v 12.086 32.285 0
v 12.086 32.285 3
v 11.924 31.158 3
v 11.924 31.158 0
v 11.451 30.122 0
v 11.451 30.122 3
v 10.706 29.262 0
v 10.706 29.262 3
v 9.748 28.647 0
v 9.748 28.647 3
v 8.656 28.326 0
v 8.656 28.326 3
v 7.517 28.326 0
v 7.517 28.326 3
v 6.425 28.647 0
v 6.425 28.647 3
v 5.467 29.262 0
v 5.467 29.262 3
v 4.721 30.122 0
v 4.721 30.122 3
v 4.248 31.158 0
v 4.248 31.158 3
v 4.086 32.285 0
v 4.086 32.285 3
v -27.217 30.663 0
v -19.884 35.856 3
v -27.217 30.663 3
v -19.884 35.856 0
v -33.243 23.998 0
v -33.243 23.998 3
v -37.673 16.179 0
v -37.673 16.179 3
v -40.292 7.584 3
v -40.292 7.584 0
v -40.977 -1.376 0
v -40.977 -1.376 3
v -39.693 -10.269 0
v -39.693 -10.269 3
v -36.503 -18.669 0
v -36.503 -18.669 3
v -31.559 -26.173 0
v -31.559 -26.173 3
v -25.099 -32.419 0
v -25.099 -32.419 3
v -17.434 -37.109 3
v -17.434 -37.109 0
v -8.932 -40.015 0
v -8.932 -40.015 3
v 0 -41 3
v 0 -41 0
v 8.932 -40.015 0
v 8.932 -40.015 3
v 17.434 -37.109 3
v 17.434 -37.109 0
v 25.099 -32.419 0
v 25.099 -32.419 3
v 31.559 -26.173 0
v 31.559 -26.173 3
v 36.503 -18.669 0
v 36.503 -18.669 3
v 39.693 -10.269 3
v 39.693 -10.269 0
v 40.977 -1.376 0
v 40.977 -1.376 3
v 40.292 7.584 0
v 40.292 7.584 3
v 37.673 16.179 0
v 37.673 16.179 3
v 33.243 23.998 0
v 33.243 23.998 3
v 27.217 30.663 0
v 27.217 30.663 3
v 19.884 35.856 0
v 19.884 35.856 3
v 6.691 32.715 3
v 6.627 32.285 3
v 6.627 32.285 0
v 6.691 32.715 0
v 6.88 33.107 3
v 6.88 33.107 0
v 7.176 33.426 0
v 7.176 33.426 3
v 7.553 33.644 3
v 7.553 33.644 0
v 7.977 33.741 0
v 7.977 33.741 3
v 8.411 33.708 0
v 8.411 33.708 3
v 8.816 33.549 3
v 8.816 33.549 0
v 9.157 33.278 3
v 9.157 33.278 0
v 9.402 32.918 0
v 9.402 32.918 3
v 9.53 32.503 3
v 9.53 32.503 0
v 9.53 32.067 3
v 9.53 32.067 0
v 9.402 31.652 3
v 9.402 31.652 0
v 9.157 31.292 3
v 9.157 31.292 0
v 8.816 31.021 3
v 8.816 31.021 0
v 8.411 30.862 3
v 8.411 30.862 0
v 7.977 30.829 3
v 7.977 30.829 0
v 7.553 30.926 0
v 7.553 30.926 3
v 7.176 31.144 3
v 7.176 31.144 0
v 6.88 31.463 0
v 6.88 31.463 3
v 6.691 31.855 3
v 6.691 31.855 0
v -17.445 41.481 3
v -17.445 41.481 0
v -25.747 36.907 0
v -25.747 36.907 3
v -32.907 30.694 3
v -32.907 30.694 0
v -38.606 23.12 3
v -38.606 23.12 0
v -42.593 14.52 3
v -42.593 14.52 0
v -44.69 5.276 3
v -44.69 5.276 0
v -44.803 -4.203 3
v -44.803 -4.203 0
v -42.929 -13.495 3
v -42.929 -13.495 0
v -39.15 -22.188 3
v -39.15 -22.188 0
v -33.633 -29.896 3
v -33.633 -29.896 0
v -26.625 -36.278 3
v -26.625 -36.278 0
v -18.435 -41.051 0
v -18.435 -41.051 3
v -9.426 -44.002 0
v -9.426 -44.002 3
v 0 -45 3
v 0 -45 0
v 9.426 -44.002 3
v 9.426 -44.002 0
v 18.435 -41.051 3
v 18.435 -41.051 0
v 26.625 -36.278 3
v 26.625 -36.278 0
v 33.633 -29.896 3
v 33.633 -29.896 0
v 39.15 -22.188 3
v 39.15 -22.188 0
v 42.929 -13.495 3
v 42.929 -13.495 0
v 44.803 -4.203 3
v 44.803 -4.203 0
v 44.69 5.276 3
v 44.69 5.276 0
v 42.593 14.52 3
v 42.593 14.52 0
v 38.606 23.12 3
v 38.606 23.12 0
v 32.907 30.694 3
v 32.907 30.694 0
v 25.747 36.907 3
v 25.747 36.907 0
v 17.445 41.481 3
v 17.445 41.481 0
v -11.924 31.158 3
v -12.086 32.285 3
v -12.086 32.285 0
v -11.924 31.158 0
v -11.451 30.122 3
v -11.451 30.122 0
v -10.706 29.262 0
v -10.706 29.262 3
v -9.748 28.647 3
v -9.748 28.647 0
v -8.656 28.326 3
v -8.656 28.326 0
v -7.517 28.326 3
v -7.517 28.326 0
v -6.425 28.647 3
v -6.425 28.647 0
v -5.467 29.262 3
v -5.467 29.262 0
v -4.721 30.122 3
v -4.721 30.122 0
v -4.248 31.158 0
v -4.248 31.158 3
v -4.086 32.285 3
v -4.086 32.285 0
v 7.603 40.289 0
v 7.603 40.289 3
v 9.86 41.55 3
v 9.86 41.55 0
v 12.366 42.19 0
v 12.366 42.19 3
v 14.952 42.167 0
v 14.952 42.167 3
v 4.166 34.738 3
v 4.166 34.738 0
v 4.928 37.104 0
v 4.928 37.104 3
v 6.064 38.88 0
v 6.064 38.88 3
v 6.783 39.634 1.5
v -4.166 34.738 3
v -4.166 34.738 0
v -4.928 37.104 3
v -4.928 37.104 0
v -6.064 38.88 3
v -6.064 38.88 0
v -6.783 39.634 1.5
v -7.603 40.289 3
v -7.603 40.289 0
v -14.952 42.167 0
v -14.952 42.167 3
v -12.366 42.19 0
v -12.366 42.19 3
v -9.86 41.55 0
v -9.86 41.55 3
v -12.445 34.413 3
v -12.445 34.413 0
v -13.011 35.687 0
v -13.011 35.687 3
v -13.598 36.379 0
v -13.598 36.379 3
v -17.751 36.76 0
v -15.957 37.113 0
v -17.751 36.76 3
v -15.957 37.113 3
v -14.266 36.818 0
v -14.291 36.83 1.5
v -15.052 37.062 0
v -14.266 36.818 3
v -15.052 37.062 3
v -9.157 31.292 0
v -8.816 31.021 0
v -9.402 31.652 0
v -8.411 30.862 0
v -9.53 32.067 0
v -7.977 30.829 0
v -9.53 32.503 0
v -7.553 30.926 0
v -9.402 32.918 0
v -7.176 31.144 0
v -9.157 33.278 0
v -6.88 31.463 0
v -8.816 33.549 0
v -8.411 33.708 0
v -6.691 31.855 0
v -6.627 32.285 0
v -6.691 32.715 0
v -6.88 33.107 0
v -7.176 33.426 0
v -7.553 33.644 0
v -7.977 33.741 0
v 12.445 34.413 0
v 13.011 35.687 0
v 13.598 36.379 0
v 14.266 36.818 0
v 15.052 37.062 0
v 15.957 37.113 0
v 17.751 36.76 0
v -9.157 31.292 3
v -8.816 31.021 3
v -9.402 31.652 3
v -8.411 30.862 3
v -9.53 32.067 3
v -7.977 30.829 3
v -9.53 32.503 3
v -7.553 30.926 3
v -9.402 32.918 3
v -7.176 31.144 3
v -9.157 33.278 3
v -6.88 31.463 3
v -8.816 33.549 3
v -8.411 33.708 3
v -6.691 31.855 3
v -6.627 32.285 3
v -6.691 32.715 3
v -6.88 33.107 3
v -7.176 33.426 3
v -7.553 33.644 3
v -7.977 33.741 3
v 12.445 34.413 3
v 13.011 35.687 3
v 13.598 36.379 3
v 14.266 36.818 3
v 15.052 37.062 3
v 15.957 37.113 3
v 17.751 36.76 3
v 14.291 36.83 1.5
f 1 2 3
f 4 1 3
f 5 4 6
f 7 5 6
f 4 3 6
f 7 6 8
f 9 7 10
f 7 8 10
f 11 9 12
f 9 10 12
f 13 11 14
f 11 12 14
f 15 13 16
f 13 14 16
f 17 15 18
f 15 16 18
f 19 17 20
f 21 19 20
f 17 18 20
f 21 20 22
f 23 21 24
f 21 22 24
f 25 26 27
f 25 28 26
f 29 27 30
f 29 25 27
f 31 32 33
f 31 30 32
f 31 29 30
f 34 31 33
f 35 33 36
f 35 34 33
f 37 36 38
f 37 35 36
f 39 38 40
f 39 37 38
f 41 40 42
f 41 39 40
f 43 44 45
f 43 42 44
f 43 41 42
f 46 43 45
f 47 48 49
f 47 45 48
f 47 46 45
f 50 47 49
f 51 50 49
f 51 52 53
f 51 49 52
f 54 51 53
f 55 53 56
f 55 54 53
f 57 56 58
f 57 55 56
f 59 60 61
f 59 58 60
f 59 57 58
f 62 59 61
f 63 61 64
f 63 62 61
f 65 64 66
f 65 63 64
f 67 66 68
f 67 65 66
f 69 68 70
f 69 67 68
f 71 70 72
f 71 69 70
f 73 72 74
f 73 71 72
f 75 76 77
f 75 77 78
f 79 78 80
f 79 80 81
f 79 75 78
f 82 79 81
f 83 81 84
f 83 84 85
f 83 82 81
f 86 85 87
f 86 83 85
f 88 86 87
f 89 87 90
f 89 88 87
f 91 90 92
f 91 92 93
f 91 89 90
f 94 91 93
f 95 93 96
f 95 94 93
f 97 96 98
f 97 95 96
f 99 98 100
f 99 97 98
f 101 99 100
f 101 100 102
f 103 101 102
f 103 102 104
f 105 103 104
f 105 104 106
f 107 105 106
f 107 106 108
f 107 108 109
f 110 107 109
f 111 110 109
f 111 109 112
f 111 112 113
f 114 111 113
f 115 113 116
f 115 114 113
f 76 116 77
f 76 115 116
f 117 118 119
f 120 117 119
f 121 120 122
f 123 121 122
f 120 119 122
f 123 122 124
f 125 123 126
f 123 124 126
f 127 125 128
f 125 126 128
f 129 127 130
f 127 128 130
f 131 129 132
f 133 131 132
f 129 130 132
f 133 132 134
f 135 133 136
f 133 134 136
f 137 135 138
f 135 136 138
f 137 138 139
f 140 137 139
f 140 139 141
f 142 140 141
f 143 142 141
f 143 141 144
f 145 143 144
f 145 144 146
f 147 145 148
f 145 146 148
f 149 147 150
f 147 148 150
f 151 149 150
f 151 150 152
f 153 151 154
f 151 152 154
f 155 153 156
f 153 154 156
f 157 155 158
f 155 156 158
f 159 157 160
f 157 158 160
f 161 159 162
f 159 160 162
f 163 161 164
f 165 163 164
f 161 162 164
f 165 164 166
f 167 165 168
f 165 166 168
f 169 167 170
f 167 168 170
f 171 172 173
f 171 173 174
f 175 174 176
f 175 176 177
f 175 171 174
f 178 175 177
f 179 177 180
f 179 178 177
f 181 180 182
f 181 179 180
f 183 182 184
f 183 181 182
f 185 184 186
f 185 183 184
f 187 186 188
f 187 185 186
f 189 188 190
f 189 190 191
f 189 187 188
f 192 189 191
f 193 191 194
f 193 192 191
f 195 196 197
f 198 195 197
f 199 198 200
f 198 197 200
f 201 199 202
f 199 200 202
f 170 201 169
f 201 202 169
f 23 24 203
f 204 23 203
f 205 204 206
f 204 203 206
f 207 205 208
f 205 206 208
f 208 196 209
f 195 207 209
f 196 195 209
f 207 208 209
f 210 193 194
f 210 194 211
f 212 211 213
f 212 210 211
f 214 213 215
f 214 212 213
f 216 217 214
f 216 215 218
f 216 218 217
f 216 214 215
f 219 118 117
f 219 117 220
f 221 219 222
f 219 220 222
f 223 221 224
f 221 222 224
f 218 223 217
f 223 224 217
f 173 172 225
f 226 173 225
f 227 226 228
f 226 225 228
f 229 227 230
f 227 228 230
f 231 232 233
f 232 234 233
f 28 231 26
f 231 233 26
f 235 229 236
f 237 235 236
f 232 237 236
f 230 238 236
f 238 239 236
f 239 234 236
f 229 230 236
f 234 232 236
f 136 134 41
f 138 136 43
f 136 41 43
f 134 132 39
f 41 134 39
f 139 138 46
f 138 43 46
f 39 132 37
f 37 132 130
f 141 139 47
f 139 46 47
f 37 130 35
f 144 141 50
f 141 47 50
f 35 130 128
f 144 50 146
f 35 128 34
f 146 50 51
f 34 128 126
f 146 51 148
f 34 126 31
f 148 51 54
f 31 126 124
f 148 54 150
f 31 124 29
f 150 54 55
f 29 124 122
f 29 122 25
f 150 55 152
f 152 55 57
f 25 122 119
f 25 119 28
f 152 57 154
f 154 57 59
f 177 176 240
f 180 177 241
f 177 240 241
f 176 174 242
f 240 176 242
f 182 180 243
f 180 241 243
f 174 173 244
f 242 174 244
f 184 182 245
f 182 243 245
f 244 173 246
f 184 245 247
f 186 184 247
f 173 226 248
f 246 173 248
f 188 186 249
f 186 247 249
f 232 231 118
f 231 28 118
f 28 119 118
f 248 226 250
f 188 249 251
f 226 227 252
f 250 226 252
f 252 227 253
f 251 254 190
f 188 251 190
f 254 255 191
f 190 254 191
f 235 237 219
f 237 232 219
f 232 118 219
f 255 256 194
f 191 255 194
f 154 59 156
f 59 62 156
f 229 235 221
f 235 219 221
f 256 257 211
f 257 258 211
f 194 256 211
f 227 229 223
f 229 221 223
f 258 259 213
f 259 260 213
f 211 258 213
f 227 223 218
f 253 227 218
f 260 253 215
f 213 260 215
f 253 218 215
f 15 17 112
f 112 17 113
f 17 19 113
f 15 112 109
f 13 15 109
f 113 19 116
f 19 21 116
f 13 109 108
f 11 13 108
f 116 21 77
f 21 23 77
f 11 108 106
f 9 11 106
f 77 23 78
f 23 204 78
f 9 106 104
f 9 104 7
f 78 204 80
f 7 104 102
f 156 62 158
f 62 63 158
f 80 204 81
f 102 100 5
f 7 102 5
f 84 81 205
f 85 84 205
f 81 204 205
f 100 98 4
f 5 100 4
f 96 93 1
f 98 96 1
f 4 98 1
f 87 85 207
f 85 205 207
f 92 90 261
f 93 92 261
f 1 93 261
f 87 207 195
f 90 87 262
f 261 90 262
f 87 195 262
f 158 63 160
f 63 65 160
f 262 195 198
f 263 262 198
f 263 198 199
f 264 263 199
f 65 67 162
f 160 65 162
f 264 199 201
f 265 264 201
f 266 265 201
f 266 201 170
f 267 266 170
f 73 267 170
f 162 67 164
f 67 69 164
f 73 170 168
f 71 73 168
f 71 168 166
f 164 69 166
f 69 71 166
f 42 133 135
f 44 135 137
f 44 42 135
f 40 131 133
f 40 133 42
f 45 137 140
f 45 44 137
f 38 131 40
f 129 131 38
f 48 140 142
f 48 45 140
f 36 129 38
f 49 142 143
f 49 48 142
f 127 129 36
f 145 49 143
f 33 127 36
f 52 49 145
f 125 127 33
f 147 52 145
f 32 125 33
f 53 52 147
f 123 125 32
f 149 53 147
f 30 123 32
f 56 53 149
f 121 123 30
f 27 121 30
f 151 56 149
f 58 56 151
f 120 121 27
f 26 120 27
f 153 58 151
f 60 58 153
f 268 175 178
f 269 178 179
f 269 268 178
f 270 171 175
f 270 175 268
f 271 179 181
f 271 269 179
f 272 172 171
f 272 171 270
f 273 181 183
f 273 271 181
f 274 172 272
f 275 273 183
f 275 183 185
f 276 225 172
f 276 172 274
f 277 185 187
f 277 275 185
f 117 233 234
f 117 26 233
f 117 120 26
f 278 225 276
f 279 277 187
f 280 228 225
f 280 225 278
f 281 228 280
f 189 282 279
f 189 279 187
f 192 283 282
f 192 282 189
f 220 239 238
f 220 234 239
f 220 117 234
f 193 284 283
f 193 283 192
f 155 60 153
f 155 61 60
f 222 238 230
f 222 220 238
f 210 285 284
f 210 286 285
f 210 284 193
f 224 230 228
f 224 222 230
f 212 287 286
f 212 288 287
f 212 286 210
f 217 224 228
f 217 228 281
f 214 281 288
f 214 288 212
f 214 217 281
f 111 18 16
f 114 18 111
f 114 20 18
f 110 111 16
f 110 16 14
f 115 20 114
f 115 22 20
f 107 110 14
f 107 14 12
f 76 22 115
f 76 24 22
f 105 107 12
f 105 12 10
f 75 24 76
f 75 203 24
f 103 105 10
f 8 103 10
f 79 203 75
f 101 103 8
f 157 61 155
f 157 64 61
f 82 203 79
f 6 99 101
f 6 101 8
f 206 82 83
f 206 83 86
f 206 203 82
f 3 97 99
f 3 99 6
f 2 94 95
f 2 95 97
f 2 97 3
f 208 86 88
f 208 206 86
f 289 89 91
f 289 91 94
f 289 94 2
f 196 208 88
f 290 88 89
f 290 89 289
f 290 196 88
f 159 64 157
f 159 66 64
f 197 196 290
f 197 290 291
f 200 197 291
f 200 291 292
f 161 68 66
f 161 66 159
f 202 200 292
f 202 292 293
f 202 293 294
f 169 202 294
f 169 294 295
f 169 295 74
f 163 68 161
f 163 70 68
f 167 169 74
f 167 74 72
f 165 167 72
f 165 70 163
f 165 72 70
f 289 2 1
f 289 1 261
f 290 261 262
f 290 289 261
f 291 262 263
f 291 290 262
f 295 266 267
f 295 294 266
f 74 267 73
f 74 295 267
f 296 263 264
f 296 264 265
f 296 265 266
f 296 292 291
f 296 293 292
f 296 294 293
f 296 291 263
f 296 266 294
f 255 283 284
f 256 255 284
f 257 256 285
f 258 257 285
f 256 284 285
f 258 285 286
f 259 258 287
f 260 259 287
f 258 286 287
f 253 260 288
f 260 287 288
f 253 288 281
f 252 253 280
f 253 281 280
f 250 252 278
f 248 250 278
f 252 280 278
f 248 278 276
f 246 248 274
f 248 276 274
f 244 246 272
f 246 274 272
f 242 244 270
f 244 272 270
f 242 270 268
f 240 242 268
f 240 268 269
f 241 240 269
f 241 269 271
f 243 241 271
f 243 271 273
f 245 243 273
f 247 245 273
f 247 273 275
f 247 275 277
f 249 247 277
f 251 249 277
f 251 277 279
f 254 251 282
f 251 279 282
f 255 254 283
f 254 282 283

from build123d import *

# Parameters (mm, degrees)
SKETCH1_R            = 45
SKETCH1_R_2          = 41
BOSS_EXTRUDE1_DEPTH  = 3
SKETCH2_R            = 1.459793725
BOSS_EXTRUDE2_DEPTH  = 3
CUT_EXTRUDE1_DEPTH   = 3
FILLET1_R            = 10
FILLET1_OF_MIRROR1_R = 10


with BuildPart() as part:
    # Sketch1 → Boss-Extrude1 (new body)
    with BuildSketch(Plane.XY):
        Circle(SKETCH1_R)
        Circle(SKETCH1_R_2, mode=Mode.SUBTRACT)
    extrude(amount=BOSS_EXTRUDE1_DEPTH)

    # Sketch2 → Boss-Extrude2 (add)
    with BuildSketch(Plane.XY.offset(3)):
        with BuildLine():
            Line((-15.668886268, 42.183954332), (-19.883661907, 35.855822249))
            add(Edge.make_bspline(
                [(-12.086416771, 32.285039051), (-12.597852714, 39.589288788), (-19.883661907, 35.855822249)],
                knots=[0, 0, 0, 1, 1, 1], degree=2))
            ThreePointArc((-12.086416771, 32.285039051), (-8.086416771, 28.285039051), (-4.086416771, 32.285039051))
            add(Edge.make_bspline(
                [(-4.086416771, 32.285039051), (-3.775529113, 34.928467106), (-6.013218517, 41.206349148), (-12.686993609, 42.383352938), (-15.668886268, 42.183954332)],
                knots=[0, 0, 0, 0, 0.461232636, 1, 1, 1, 1], degree=3))
        make_face()
        with Locations((-8.086416771, 32.285039051)):
            Circle(SKETCH2_R, mode=Mode.SUBTRACT)
    boss_extrude2 = extrude(amount=-BOSS_EXTRUDE2_DEPTH)

    # Sketch3 → Cut-Extrude1 (cut)
    with BuildSketch(Plane.XY.offset(3)):
        Polygon((0, 45), (0, 37.437139849), (-7.602836832, 40.288917485), (-11.716734304, 43.447878398), (-6.589372727, 48.458841459), align=None)
    cut_extrude1 = extrude(amount=-CUT_EXTRUDE1_DEPTH, mode=Mode.SUBTRACT)

    # Fillet1
    # the kernel refuses this fillet: 10 mm, written as the material it takes off along each edge
    with BuildSketch(Plane(origin=(-11.716734304, 43.447878398, 18.140851252), x_dir=(-0.9457987516283185, -0.32475332395268036, 0), z_dir=(0, 0, -1))) as fillet1_piece_1:
        with BuildLine():
            CenterArc((5.383413779, -9.977332791), FILLET1_R, 86.141498066, 59.431279914)
            Line((-2.865036036, -4.323743166), (-3.030005033, -4.210671374))
            ThreePointArc((-3.030005033, -4.210671374), (-1.599238142, -2.051398055), (-0.166720124, 0.110473528))
            Line((-0.166720124, 0.110473528), (-0.013458534, 0.199546656))
            ThreePointArc((-0.013458534, 0.199546656), (3.02817025, 0.30200244), (6.069799035, 0.199546656))
            Line((6.069799035, 0.199546656), (6.056340501, 0))
        make_face()
    extrude(amount=33.281702504, mode=Mode.SUBTRACT)

    # Mirror1: Boss-Extrude2, Cut-Extrude1 across plane
    add(boss_extrude2.mirror(Plane(origin=(0, 0, 0), x_dir=(0, 0, 1), z_dir=(1, 0, 0))))
    add(cut_extrude1.mirror(Plane(origin=(0, 0, 0), x_dir=(0, 0, 1), z_dir=(1, 0, 0))), mode=Mode.SUBTRACT)

    # Fillet1 of Mirror1
    # the kernel refuses this fillet: 10 mm, written as the material it takes off along each edge
    with BuildSketch(Plane(origin=(11.716734304, 43.447878398, 18.140851252), x_dir=(0.9457987516283181, -0.324753323952681, 0), z_dir=(0, 0, -1))) as fillet1_of_mirror1_piece_1:
        with BuildLine():
            CenterArc((5.383413779, 9.977332791), FILLET1_OF_MIRROR1_R, 214.42722202, 59.431279914)
            Line((-2.865036036, 4.323743166), (-3.030005033, 4.210671374))
            ThreePointArc((-3.030005033, 4.210671374), (-1.599238142, 2.051398055), (-0.166720124, -0.110473528))
            Line((-0.166720124, -0.110473528), (-0.013458534, -0.199546656))
            ThreePointArc((-0.013458534, -0.199546656), (3.02817025, -0.30200244), (6.069799035, -0.199546656))
            Line((6.069799035, -0.199546656), (6.056340501, 0))
        make_face()
    extrude(amount=33.281702504, mode=Mode.SUBTRACT)


solid = part.part
